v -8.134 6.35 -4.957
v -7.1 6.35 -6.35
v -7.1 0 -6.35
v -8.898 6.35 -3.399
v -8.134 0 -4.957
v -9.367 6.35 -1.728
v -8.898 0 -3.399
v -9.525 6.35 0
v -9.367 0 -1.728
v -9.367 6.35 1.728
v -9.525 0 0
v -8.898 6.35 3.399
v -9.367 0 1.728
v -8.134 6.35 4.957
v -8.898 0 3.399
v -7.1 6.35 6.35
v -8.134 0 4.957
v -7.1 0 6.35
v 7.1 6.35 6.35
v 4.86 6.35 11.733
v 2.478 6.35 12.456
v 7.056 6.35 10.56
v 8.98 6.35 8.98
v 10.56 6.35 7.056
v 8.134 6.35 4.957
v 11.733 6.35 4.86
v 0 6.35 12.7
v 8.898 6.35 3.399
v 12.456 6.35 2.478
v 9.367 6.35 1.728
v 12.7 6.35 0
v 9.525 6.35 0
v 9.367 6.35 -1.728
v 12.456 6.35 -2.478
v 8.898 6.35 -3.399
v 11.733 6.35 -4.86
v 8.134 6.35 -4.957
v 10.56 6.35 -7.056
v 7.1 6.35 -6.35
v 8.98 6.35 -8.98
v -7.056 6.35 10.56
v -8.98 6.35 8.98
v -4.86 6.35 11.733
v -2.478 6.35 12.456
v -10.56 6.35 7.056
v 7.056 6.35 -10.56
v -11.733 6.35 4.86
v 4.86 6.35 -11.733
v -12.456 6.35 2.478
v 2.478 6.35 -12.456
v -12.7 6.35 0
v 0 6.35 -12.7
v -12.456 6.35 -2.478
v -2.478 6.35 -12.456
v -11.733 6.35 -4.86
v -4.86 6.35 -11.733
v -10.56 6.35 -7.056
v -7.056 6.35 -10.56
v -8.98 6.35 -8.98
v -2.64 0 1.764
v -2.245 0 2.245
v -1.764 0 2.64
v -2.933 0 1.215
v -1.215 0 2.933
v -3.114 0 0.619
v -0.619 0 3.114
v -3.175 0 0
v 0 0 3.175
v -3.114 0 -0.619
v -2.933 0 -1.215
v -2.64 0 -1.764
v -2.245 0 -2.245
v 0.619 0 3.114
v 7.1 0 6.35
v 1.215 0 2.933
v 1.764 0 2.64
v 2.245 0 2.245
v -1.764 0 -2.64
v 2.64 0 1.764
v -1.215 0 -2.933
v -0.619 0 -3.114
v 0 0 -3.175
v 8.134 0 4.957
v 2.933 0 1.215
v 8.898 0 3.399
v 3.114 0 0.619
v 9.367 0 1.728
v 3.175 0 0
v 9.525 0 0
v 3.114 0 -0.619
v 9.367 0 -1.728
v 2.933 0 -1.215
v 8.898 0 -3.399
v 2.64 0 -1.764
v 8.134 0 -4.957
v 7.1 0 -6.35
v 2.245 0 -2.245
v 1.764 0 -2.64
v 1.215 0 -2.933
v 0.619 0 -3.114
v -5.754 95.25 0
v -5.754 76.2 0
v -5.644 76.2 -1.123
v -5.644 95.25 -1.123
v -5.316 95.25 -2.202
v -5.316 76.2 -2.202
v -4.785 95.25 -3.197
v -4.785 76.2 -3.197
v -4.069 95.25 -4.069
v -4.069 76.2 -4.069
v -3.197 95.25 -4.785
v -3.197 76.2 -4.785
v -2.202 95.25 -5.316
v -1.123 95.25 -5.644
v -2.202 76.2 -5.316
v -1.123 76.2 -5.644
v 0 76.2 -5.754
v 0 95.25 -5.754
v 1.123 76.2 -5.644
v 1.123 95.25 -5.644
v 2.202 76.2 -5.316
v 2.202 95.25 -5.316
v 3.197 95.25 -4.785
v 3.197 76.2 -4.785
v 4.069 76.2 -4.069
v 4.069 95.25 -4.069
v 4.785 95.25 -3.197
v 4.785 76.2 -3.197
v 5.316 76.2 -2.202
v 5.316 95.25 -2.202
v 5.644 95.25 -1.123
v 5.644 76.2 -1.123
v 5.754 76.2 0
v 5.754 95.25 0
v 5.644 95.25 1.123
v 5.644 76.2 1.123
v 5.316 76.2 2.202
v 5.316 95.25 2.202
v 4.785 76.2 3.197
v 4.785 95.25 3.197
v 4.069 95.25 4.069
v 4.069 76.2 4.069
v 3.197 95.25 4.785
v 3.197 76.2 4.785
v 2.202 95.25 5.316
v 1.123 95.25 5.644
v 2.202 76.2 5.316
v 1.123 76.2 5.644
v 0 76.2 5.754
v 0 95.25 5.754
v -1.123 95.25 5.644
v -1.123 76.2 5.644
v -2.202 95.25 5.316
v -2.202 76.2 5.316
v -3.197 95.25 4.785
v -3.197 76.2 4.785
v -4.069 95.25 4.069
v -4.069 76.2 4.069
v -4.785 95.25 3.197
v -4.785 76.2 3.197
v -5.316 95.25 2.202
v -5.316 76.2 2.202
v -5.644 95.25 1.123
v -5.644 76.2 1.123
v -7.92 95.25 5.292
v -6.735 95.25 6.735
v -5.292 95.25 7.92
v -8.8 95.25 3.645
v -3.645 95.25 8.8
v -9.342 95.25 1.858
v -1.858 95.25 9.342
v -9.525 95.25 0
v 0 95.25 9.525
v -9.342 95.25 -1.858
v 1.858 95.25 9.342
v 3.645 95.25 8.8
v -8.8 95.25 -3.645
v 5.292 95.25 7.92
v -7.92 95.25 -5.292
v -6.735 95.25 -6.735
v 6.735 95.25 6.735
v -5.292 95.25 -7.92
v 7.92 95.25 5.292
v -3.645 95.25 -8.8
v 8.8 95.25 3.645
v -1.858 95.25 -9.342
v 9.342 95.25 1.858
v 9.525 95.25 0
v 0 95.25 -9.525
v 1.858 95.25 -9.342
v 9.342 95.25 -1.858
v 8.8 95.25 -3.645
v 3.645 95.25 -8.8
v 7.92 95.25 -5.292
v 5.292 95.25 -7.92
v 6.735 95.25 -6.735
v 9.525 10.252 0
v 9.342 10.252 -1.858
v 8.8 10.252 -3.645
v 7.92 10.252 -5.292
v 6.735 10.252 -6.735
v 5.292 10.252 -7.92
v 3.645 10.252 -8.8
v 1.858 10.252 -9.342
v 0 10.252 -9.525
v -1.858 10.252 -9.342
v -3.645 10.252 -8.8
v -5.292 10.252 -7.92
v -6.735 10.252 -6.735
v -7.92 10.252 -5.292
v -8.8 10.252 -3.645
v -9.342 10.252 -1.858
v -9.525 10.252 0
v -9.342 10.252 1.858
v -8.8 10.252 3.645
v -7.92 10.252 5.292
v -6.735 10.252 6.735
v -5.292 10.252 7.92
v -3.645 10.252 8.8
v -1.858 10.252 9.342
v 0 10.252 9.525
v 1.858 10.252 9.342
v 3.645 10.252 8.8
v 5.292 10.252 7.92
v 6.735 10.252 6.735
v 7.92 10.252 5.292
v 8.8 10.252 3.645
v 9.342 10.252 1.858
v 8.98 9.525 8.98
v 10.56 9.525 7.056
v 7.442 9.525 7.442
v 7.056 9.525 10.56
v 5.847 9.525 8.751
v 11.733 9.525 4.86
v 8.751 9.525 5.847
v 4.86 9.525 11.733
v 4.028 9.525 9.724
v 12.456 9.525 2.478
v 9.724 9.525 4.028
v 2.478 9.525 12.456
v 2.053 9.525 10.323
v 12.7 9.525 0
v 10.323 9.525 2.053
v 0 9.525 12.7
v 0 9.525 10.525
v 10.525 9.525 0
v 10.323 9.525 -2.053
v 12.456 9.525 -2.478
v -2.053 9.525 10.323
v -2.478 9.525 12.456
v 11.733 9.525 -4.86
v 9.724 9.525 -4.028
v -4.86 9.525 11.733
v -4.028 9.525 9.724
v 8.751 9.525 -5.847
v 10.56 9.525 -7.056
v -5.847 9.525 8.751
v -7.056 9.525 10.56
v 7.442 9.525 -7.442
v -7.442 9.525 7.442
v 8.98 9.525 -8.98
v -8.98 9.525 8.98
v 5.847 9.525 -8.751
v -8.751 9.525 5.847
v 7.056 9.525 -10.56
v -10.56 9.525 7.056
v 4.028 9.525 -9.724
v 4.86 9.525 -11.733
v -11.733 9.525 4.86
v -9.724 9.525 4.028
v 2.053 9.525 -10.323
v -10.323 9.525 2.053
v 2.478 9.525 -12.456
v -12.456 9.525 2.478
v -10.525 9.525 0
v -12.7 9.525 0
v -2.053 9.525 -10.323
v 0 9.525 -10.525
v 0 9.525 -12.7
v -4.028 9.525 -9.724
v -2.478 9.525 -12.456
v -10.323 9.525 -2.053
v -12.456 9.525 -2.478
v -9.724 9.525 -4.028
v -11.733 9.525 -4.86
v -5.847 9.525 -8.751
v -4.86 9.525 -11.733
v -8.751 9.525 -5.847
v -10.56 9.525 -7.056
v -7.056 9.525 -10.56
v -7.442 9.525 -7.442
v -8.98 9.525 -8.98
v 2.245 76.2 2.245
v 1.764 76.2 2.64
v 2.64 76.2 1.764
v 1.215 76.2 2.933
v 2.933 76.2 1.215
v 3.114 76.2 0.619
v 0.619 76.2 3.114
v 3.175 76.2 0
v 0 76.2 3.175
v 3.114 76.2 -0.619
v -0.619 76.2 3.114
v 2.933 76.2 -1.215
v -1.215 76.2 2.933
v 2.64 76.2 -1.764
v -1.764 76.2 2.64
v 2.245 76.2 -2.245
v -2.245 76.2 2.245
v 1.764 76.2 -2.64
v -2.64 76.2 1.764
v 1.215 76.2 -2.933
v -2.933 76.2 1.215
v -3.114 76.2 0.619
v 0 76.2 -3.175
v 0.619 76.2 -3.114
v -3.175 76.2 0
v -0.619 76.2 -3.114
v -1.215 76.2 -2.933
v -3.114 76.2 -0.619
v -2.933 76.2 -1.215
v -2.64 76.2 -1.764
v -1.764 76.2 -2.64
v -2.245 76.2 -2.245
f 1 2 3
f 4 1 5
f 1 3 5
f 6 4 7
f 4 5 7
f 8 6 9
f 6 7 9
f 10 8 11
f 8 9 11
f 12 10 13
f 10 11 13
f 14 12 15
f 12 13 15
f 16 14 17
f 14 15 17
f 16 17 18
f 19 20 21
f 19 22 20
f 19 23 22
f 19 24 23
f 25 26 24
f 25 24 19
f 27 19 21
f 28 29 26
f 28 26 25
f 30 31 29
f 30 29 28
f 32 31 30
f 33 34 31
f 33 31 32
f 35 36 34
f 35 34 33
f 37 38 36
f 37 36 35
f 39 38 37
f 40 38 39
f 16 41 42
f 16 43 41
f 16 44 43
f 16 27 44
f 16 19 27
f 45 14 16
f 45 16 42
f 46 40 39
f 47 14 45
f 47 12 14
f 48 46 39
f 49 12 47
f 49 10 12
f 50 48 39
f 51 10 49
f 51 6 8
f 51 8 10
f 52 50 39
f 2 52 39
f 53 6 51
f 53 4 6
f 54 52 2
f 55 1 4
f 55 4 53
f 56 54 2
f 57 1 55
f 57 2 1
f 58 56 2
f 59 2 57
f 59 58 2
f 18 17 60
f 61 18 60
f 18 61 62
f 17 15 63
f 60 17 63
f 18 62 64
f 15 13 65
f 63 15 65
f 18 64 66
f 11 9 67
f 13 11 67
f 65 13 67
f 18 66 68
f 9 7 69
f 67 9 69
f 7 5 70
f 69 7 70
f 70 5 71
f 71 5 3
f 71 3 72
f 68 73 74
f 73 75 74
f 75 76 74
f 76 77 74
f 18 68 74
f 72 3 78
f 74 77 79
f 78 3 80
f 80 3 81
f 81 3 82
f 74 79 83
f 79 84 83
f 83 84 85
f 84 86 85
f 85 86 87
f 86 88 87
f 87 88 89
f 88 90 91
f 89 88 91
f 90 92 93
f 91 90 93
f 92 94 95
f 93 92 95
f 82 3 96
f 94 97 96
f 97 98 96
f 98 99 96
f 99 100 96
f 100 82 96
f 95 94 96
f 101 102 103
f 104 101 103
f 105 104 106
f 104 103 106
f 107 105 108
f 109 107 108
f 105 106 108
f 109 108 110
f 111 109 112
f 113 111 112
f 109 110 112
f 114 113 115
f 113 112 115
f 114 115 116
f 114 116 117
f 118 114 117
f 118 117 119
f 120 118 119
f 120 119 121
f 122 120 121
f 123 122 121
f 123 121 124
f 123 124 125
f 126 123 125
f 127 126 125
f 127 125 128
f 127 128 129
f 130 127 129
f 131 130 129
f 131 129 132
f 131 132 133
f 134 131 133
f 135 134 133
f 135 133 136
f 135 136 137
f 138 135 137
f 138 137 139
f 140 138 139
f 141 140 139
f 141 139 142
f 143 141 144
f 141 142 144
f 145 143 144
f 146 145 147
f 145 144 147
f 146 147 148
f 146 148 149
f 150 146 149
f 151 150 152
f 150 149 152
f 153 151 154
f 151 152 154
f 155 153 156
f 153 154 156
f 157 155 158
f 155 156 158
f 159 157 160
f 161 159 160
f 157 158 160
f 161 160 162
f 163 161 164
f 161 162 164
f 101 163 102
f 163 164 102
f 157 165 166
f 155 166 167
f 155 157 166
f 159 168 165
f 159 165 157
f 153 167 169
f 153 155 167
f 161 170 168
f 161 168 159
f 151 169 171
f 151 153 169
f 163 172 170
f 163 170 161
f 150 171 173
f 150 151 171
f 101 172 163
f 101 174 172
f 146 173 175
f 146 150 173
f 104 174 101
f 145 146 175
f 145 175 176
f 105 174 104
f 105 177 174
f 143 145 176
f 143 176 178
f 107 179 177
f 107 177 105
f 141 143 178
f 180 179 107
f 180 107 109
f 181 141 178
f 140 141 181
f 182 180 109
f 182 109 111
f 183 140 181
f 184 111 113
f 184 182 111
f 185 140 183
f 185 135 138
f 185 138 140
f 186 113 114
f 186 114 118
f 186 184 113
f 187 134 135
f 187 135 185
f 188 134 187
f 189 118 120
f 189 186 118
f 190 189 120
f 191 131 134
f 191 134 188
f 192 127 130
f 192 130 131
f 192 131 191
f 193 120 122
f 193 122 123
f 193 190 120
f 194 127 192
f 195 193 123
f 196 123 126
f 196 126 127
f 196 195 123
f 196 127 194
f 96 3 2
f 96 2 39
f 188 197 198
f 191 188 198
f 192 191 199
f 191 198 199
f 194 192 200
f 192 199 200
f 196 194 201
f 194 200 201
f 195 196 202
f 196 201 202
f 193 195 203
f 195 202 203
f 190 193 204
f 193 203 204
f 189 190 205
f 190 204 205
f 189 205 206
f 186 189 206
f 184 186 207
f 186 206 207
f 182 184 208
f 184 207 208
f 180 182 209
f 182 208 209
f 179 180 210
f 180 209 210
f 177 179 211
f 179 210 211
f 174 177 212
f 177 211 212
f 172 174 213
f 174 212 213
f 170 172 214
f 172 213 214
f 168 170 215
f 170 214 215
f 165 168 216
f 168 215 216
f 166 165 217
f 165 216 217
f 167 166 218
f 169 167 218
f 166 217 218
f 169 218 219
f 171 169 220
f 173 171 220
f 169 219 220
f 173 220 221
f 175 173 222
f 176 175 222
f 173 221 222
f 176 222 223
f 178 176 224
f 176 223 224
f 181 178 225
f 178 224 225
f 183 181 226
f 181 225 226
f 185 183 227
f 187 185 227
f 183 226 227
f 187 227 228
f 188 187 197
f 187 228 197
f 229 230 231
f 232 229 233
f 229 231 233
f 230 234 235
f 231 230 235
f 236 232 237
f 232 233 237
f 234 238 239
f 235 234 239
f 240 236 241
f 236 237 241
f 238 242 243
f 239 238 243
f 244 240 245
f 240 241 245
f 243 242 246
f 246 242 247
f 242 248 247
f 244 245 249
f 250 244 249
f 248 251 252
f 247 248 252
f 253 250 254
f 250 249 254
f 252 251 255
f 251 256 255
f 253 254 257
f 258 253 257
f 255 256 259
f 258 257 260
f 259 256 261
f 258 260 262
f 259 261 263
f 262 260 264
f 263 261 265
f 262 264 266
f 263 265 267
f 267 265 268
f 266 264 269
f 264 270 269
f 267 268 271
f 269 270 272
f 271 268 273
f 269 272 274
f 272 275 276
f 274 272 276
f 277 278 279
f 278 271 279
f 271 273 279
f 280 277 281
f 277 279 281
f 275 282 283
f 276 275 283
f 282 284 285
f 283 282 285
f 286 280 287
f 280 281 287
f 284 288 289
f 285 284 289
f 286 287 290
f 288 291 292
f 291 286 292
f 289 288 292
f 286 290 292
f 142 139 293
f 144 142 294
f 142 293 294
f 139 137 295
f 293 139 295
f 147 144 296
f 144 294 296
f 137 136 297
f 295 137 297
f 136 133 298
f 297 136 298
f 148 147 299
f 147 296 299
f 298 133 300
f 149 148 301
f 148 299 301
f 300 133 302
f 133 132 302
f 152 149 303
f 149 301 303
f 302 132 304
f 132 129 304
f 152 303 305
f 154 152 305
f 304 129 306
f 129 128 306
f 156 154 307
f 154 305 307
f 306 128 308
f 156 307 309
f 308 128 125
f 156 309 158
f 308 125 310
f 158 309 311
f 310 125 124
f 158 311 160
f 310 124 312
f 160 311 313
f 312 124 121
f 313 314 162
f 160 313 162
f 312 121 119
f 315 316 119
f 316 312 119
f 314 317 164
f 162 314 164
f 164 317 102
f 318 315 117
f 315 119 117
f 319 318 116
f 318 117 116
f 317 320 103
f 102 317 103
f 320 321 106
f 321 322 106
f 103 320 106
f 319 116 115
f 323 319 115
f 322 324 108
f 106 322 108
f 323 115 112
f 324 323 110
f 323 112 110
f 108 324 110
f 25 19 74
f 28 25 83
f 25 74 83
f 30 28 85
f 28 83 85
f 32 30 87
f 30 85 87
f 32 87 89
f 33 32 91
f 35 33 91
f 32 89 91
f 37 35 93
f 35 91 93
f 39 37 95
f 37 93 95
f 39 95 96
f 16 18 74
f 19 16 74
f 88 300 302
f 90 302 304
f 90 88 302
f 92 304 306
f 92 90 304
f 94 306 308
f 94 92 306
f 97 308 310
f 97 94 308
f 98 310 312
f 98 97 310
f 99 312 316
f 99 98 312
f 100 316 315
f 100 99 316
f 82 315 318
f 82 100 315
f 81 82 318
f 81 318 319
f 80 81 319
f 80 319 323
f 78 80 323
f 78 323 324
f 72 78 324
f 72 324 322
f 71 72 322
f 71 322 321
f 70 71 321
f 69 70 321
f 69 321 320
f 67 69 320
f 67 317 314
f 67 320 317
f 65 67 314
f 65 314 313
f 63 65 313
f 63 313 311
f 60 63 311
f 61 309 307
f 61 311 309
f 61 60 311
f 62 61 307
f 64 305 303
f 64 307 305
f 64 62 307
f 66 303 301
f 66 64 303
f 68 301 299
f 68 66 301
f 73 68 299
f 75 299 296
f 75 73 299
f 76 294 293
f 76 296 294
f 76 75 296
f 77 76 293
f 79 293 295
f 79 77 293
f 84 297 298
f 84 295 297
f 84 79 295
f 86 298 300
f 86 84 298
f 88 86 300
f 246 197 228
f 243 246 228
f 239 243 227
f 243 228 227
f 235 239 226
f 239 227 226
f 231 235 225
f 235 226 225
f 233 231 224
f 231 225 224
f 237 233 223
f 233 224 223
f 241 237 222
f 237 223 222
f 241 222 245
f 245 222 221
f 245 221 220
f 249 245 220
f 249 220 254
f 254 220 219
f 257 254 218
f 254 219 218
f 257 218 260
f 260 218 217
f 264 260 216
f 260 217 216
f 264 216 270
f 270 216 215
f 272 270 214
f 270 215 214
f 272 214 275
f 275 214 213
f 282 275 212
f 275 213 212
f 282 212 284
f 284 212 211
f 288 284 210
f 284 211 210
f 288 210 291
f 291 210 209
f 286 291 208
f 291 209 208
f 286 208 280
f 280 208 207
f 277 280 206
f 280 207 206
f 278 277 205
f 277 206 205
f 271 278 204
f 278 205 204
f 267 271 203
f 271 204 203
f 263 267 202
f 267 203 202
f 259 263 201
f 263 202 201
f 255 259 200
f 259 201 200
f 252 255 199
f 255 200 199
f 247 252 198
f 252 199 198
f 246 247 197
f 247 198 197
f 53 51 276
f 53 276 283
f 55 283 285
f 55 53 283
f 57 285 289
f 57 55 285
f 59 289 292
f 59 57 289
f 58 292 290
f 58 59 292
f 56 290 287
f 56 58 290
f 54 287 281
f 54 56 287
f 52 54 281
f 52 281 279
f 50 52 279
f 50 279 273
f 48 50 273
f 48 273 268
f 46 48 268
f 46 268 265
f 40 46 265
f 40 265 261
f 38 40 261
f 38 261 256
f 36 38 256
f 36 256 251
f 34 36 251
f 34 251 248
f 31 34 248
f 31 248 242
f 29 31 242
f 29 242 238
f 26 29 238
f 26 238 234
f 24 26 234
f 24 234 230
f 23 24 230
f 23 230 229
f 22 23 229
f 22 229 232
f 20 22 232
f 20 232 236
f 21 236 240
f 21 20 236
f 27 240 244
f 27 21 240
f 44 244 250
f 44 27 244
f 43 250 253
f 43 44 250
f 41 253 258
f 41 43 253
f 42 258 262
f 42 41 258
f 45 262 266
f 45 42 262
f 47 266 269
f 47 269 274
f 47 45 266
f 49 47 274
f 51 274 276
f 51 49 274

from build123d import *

# Parameters (mm, degrees)
SKETCH1_R                       = 9.525
SKETCH1_R_2                     = 3.175
BOSS_EXTRUDE1_DEPTH             = 95.25
SKETCH3_R                       = 12.7
SKETCH3_R_2                     = 9.525
BOSS_EXTRUDE2_DEPTH             = 3.175
SKETCH4_R                       = 6.35
BOSS_EXTRUDE3_DEPTH             = 19.05
TAP_DRILL_FOR_1_2_20_TAP1_D     = 11.50874
TAP_DRILL_FOR_1_2_20_TAP1_DEPTH = 19.05
CHAMFER1_SIZE                   = 1
CHAMFER1_SIZE2                  = 0.726542528
SKETCH8_W                       = 16.189039501
SKETCH8_H                       = 7.642767638
SKETCH8_H_2                     = 8.514884137
CUT_EXTRUDE1_DEPTH              = 6.35


with BuildPart() as part:
    # Sketch1 → Boss-Extrude1 (new body)
    with BuildSketch(Plane(origin=(0, 0, 0), x_dir=(1, 0, 0), z_dir=(0, 1, 0))):
        Circle(SKETCH1_R)
        Circle(SKETCH1_R_2, mode=Mode.SUBTRACT)
    extrude(amount=BOSS_EXTRUDE1_DEPTH)

    # Sketch3 → Boss-Extrude2 (add)
    with BuildSketch(Plane(origin=(0, 6.35, 0), x_dir=(-1, 0, 0), z_dir=(0, -1, 0))):
        Circle(SKETCH3_R)
        Circle(SKETCH3_R_2, mode=Mode.SUBTRACT)
    extrude(amount=-BOSS_EXTRUDE2_DEPTH)

    # Sketch4 → Boss-Extrude3 (add)
    with BuildSketch(Plane(origin=(0, 95.25, 0), x_dir=(1, 0, 0), z_dir=(0, 1, 0))):
        Circle(SKETCH4_R)
    extrude(amount=-BOSS_EXTRUDE3_DEPTH)

    # Tap Drill for 1/2-20 Tap1
    with Locations(Plane(origin=(0, 95.25, 0), x_dir=(1, 0, 0), z_dir=(0, 1, 0))):
        with Locations((0, 0)):
            Hole(TAP_DRILL_FOR_1_2_20_TAP1_D / 2, depth=TAP_DRILL_FOR_1_2_20_TAP1_DEPTH)

    # Chamfer1
    chamfer1_edges = [part.edges().sort_by_distance(p)[0] for p in [
        (-9.525, 9.525, 0),
    ]]
    chamfer1_side = [part.faces().sort_by_distance(p)[0] for p in [
        (12.340789755, 9.525, 0),
    ]]
    chamfer(chamfer1_edges, length=CHAMFER1_SIZE, length2=CHAMFER1_SIZE2, reference=chamfer1_side[0])

    # Sketch8 → Cut-Extrude1 (cut)
    with BuildSketch(Plane.XZ):
        with Locations((0.474519751, 10.171383819)):
            Rectangle(SKETCH8_W, SKETCH8_H)
        with Locations((0.474519751, -10.607442069)):
            Rectangle(SKETCH8_W, SKETCH8_H_2)
    extrude(amount=-CUT_EXTRUDE1_DEPTH, mode=Mode.SUBTRACT)


solid = part.part
